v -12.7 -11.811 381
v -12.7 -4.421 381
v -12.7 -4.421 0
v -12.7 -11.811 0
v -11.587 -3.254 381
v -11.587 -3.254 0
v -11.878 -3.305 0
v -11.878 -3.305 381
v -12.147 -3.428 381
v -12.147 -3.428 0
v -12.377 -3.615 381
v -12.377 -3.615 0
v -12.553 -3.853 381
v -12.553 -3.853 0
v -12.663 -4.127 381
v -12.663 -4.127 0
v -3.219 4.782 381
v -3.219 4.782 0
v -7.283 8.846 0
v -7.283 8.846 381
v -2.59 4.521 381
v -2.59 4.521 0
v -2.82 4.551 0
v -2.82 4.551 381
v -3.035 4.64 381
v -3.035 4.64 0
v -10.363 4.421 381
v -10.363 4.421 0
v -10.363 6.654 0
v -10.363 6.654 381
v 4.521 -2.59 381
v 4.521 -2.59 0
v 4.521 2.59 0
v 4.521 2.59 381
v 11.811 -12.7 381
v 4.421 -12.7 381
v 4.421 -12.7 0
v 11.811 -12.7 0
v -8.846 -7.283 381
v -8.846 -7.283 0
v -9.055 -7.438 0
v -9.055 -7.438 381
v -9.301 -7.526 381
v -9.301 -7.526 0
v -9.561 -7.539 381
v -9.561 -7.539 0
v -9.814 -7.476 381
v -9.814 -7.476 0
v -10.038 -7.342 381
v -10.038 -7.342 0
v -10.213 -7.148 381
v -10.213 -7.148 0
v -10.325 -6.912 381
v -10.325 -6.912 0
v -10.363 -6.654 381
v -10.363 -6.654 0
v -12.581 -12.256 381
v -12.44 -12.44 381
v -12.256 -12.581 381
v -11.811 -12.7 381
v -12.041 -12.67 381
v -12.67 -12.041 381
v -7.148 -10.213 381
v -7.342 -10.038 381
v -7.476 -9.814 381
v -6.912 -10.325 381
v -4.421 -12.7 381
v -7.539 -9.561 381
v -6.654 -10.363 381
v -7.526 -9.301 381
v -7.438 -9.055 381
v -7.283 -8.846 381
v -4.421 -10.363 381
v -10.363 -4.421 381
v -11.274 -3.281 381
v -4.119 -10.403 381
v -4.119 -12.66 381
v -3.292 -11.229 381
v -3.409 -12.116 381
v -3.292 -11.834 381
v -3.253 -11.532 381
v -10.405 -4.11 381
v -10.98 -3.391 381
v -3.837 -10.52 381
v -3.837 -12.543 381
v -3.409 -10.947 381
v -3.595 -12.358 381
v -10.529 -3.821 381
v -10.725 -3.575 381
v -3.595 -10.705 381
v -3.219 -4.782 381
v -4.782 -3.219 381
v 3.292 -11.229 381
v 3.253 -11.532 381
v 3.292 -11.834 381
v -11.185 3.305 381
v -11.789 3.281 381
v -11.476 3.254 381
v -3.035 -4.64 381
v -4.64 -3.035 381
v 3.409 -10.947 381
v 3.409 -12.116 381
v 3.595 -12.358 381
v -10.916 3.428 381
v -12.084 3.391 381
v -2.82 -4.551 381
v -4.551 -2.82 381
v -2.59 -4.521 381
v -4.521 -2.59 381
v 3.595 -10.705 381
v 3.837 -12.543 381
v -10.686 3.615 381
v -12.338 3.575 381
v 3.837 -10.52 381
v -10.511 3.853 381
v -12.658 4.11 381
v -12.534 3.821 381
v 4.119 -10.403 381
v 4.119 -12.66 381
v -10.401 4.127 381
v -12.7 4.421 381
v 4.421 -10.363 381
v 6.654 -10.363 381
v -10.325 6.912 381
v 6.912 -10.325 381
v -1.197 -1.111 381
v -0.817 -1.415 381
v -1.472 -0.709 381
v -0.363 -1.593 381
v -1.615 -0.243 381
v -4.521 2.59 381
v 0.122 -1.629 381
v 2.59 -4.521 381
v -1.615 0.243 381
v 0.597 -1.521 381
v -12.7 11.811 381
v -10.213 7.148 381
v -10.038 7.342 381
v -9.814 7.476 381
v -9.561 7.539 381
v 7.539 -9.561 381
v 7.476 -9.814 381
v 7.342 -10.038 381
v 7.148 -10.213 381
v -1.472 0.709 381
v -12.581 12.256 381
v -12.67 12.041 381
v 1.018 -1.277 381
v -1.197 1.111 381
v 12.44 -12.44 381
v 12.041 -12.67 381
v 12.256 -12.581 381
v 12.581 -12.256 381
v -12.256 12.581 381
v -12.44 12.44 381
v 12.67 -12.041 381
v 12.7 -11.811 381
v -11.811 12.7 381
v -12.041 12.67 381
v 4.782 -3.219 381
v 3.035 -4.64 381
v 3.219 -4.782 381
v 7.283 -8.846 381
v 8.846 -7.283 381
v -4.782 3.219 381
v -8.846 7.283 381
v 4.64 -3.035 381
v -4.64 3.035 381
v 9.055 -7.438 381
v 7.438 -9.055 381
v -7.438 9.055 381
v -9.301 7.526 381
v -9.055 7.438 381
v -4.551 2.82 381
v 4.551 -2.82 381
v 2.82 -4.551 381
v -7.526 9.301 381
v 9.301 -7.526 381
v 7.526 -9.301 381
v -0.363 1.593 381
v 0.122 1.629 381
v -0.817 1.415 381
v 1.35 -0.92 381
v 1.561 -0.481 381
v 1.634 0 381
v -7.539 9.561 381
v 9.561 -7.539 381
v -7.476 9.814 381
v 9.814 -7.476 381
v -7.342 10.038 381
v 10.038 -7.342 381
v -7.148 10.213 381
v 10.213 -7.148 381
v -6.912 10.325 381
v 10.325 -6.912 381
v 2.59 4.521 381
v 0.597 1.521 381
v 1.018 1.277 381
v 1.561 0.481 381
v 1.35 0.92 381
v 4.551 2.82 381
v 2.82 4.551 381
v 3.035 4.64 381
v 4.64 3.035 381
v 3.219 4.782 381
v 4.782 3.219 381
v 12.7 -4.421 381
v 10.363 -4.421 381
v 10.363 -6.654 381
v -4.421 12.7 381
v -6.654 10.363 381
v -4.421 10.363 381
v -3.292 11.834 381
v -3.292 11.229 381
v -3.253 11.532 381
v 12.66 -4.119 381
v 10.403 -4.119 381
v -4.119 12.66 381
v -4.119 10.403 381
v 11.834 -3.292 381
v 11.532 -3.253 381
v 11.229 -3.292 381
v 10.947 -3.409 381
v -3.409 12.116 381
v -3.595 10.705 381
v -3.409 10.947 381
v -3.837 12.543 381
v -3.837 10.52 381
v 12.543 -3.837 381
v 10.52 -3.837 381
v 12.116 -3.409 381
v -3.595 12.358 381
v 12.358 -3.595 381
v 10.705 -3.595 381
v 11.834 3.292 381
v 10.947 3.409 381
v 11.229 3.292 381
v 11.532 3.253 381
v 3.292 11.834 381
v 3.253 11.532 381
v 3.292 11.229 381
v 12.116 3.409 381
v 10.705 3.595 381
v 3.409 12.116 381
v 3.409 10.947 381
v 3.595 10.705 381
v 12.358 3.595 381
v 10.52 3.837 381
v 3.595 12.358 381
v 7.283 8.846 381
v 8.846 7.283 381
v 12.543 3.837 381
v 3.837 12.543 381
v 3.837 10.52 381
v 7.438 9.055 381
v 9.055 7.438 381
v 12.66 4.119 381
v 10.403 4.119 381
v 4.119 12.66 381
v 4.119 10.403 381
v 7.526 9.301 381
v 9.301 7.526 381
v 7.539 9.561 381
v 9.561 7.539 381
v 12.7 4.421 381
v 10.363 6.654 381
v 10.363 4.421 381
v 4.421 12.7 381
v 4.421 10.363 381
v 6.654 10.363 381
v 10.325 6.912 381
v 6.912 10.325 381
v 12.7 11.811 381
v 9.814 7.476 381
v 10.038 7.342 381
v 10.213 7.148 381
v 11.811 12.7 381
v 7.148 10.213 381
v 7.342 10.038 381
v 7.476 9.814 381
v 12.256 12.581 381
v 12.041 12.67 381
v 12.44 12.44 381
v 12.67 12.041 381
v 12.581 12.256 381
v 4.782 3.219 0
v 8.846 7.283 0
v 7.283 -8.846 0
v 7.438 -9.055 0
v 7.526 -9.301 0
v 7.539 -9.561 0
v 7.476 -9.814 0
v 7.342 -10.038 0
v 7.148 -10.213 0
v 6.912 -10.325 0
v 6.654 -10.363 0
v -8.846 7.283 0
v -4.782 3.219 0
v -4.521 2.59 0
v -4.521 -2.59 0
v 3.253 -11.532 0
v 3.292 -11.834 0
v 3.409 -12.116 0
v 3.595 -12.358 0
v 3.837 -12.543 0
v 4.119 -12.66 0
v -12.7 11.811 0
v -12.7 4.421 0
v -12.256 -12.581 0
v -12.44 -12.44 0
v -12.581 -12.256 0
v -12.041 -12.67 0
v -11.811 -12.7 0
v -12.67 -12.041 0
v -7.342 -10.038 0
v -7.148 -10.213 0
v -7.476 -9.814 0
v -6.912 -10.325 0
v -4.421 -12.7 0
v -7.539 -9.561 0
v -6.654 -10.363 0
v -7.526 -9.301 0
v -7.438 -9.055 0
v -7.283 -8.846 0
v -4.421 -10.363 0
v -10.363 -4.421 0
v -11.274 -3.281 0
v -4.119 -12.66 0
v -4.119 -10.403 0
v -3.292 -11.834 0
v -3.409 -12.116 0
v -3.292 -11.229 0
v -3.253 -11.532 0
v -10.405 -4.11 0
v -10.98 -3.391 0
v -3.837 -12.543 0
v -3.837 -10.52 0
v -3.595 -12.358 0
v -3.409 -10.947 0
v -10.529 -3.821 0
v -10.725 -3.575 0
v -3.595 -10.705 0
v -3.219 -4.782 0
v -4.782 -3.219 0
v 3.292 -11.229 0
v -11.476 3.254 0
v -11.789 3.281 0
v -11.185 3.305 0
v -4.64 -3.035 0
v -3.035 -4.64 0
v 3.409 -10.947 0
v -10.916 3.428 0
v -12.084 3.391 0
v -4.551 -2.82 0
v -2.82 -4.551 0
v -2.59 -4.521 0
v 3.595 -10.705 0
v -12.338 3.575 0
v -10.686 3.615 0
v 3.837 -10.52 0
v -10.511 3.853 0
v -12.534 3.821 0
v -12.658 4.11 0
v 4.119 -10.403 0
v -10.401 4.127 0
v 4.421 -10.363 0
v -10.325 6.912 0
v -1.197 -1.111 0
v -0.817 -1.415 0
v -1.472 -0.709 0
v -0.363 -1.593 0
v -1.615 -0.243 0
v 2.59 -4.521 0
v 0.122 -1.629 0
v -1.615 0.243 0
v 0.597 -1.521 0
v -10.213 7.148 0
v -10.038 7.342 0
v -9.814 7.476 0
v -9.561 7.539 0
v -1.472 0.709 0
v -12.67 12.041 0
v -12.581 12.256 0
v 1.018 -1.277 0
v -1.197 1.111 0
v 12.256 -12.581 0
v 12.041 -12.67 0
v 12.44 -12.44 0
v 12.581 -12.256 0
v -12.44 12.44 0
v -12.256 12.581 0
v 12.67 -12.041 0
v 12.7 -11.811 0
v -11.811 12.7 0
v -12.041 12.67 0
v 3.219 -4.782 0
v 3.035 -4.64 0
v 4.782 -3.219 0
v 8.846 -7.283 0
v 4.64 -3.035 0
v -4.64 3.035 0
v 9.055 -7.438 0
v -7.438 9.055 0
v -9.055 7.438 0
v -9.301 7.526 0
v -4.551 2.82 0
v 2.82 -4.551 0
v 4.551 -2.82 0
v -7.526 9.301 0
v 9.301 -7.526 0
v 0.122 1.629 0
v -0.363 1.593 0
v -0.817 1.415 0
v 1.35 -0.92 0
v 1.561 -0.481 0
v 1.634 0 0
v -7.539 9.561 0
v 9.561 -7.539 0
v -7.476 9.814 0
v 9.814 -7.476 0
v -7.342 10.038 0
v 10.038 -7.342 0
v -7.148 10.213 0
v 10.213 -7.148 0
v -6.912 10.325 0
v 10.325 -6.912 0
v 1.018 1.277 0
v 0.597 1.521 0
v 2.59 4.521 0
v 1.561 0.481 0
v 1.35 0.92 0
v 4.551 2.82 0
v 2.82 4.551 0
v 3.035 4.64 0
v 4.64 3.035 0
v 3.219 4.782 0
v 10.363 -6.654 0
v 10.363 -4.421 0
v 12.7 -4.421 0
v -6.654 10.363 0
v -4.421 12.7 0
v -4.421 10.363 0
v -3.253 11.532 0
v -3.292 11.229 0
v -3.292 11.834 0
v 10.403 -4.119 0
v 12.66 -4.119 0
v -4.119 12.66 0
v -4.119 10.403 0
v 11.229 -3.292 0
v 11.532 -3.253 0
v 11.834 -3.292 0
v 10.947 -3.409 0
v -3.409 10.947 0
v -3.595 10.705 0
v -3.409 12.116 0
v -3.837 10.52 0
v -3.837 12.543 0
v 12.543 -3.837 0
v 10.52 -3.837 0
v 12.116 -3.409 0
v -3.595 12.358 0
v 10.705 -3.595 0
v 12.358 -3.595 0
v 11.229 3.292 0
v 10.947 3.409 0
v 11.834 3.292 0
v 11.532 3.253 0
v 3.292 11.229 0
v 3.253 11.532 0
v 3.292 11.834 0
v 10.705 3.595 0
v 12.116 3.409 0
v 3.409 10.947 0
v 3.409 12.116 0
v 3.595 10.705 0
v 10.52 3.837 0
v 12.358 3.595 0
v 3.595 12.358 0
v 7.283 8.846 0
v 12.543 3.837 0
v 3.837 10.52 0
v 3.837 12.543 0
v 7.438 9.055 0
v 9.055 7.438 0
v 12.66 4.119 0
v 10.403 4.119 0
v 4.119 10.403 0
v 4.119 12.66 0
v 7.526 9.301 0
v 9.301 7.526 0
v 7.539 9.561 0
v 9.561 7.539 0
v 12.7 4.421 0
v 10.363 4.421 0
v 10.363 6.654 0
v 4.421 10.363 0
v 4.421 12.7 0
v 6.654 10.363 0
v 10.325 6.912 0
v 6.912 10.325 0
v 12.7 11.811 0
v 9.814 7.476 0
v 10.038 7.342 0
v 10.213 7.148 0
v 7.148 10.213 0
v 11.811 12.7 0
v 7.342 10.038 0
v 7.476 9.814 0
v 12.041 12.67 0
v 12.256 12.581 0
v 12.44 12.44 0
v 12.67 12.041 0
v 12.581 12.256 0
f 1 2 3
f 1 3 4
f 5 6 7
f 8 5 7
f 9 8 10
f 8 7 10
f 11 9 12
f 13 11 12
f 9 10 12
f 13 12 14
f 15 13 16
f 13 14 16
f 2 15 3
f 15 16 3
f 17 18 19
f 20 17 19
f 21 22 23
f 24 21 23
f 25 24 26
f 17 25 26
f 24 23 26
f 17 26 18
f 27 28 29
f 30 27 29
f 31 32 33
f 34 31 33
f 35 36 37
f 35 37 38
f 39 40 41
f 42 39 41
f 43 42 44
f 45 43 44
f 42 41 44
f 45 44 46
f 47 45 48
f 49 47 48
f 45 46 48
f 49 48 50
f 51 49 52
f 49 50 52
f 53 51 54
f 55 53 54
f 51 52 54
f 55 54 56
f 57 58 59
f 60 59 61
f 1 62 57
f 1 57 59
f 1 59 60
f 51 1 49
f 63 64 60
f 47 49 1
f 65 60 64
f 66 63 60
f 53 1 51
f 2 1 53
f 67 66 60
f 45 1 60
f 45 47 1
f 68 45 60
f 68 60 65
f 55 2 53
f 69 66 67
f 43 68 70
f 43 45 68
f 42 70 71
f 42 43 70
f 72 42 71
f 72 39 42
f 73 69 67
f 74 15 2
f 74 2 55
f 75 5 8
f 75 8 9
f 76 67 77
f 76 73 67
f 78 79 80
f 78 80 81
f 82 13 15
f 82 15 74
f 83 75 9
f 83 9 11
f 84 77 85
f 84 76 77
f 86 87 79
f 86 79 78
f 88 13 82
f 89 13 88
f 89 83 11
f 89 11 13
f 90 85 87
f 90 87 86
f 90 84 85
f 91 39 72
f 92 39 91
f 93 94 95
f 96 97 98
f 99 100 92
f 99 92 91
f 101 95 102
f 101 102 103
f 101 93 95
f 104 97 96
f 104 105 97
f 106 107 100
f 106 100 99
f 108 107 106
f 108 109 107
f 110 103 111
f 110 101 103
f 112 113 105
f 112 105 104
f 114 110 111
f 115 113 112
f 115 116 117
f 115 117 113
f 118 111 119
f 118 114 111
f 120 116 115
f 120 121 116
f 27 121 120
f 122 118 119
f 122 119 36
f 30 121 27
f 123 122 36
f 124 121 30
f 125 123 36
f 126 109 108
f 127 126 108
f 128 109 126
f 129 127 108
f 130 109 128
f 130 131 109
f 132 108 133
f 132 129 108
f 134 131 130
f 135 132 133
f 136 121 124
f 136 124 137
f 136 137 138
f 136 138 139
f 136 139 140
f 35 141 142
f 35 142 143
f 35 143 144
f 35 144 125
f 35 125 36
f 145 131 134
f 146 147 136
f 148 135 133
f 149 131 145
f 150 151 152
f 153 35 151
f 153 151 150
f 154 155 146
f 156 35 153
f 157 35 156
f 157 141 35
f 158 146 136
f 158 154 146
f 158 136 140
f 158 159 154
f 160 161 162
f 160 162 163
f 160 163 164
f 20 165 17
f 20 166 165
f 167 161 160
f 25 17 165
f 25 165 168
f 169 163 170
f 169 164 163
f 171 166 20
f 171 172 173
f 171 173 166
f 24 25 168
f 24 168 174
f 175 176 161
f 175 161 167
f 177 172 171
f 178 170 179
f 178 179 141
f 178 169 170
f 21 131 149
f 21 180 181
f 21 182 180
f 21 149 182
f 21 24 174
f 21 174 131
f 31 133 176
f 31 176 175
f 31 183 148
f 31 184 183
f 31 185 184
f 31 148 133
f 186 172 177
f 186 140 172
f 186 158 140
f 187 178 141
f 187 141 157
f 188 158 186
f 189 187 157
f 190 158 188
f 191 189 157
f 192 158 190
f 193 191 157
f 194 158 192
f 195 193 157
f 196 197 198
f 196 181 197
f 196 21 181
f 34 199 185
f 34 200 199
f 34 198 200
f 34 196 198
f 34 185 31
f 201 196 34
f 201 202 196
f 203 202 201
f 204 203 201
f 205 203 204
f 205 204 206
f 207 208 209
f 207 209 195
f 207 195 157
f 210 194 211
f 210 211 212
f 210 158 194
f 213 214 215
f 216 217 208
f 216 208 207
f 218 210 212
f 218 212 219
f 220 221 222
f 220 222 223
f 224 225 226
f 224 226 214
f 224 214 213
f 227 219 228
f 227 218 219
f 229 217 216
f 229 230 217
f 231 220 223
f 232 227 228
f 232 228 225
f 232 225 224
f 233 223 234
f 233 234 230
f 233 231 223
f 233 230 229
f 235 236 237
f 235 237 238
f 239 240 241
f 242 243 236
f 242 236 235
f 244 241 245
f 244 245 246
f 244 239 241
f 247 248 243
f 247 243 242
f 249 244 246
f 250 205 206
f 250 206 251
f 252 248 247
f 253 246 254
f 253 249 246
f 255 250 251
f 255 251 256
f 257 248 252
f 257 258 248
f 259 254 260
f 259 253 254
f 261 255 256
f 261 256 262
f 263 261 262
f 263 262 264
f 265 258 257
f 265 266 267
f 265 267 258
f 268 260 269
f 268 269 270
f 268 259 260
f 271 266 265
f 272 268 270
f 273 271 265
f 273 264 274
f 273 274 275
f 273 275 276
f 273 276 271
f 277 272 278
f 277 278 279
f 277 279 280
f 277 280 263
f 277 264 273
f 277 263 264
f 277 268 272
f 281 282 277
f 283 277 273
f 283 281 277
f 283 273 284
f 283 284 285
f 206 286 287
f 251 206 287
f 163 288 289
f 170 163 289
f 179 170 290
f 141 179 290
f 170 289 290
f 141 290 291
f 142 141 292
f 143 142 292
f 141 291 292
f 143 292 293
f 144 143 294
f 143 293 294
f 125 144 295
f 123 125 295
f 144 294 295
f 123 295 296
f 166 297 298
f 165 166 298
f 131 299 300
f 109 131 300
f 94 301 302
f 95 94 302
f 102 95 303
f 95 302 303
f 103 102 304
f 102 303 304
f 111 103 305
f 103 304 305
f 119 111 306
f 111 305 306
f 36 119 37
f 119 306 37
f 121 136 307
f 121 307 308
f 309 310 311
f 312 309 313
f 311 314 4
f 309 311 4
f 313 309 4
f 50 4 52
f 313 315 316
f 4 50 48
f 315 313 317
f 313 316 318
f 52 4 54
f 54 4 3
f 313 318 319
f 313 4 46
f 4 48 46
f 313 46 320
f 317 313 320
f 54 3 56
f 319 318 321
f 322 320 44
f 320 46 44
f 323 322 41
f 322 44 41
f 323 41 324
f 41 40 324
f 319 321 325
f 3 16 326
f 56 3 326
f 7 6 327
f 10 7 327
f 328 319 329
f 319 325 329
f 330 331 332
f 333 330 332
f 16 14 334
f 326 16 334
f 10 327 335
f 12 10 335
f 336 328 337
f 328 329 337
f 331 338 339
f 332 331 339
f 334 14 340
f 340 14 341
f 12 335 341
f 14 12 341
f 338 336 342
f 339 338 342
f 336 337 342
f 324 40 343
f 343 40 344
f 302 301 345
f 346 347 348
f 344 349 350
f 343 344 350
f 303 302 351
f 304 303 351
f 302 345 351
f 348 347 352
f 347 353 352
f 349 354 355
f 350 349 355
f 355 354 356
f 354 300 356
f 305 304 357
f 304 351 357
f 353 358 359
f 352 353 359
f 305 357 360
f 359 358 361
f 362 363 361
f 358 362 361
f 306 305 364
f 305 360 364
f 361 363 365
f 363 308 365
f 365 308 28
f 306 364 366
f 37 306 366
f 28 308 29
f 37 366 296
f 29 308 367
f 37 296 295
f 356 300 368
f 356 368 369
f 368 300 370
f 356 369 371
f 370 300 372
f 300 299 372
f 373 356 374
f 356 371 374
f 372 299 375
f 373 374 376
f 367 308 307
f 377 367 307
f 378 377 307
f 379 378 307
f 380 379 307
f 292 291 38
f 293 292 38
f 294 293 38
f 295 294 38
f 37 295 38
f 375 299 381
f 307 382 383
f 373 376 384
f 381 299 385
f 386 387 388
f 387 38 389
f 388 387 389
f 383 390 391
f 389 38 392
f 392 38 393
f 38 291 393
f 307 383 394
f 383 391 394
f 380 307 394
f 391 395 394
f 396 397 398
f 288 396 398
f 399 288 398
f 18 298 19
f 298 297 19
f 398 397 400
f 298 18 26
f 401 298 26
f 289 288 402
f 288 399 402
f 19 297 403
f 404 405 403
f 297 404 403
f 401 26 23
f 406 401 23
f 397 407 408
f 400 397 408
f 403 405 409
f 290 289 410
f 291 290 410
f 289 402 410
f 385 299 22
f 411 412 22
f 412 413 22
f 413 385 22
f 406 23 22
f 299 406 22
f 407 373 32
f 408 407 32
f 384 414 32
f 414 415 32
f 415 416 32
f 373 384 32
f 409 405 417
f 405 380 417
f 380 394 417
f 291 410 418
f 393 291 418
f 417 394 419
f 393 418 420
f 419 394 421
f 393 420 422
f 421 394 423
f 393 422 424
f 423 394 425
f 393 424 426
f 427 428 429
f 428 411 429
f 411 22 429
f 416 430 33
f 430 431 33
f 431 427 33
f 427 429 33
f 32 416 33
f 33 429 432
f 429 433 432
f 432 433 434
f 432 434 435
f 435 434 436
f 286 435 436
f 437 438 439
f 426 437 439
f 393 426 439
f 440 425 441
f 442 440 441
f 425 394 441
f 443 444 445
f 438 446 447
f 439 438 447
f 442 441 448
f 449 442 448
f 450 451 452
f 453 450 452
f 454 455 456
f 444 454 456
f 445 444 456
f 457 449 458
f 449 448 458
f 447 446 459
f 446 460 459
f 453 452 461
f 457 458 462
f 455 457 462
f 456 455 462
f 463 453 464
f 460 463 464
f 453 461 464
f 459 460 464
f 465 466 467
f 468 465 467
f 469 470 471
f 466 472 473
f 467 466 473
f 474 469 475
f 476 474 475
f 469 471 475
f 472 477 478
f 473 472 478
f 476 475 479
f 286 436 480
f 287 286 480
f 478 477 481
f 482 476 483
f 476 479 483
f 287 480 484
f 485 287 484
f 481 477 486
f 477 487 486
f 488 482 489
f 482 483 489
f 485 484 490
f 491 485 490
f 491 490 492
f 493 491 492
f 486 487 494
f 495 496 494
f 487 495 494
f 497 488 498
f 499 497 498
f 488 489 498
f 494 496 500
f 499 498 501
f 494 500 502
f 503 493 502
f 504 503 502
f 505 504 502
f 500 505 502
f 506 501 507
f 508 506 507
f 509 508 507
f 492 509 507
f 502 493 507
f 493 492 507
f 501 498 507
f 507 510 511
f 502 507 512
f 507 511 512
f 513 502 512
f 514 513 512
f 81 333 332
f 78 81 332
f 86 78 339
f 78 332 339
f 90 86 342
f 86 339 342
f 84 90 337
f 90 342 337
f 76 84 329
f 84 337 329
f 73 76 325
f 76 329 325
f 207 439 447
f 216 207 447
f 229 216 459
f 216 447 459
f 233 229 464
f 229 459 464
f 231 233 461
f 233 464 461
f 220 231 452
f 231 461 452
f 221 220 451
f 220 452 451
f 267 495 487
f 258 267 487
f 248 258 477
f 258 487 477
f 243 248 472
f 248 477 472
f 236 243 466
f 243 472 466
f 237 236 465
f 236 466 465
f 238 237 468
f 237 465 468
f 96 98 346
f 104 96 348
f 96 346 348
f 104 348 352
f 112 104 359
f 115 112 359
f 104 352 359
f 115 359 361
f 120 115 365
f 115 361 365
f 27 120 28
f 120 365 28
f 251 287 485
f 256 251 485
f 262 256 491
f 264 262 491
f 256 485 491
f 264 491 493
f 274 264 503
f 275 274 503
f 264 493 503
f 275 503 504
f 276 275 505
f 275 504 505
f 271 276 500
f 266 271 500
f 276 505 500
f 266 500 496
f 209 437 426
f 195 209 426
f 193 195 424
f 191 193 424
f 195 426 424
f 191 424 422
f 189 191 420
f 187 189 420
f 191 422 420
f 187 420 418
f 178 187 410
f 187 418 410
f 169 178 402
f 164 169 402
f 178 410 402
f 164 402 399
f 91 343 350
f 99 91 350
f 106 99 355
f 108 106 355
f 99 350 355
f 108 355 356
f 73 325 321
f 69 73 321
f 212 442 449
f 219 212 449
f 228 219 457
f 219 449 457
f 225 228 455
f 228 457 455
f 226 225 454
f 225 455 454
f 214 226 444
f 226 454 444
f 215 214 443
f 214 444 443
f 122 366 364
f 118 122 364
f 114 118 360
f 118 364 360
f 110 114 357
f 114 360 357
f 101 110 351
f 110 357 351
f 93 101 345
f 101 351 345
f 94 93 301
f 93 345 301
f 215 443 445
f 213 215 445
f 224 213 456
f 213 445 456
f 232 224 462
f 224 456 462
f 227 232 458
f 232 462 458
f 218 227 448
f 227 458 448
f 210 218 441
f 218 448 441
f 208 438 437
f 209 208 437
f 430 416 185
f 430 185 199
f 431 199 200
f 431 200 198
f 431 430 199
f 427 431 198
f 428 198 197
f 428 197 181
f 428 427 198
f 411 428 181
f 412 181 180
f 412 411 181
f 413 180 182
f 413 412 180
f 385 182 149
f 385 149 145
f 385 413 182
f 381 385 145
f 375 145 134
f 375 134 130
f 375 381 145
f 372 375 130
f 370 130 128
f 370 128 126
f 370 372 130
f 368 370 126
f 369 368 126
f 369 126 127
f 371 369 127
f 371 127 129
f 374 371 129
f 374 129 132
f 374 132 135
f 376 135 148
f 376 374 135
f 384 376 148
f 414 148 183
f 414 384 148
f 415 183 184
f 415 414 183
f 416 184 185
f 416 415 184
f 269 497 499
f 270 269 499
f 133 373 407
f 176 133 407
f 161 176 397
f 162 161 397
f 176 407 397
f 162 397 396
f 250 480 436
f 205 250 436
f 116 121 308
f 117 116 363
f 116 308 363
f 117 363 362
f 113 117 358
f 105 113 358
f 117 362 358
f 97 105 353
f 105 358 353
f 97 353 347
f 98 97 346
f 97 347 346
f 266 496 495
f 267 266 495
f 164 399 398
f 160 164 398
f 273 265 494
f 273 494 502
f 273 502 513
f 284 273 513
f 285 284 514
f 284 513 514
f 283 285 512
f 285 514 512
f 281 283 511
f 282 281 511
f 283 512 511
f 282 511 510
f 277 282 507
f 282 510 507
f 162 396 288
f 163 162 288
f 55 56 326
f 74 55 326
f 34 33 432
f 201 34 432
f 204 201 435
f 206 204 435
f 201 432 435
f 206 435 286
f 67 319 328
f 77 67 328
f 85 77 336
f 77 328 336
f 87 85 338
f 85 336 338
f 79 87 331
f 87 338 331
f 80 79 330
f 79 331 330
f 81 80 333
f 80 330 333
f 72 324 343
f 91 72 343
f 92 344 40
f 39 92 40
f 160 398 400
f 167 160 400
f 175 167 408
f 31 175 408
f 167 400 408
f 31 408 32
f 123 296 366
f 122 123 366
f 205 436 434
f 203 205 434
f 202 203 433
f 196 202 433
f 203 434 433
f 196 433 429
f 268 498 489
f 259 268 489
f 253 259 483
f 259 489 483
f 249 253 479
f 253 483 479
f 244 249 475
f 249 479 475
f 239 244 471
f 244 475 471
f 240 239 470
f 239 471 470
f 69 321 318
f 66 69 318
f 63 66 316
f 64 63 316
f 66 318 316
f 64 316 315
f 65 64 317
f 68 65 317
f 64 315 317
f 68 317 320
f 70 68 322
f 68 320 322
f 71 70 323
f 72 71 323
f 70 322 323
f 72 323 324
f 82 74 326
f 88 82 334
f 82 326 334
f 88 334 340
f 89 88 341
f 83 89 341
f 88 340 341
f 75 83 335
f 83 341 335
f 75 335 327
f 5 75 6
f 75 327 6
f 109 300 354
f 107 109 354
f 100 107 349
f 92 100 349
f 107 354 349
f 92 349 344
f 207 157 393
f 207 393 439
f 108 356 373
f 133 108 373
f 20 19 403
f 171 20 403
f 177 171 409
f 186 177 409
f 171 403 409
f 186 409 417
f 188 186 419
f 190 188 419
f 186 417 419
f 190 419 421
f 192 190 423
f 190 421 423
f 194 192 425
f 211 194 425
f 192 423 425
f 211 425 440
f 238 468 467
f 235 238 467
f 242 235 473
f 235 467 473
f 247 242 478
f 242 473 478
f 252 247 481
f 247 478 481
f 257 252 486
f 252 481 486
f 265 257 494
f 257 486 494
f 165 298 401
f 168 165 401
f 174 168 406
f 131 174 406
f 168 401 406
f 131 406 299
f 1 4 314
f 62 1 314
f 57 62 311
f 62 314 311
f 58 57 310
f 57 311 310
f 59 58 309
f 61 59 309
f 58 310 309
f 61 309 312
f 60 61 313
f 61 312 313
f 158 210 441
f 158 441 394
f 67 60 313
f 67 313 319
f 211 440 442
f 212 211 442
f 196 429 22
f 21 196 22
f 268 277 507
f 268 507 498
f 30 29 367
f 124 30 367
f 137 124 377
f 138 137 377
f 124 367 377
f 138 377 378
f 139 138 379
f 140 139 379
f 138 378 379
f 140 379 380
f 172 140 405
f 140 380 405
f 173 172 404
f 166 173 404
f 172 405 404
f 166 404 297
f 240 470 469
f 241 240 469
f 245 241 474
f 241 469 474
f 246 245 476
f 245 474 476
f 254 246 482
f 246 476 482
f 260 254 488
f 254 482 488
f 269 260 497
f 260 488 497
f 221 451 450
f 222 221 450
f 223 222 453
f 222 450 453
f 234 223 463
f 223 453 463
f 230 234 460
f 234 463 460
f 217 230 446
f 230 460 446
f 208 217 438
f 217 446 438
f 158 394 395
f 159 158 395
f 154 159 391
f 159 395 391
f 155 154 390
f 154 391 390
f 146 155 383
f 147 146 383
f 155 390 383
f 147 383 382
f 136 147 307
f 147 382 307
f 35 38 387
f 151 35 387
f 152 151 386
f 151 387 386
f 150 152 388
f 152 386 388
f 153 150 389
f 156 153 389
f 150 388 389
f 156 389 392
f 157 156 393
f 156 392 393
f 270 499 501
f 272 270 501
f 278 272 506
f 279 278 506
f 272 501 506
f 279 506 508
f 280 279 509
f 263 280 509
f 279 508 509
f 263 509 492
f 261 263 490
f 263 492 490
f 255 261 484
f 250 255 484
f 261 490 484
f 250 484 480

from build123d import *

# Parameters (mm, degrees)
F1_R     = 1.6335205603
F2_DEPTH = 381


# Not quite as in the source:
# - a variable given as a bare number and used for a length is read in inches; the dataset says mm whatever the document's units were


with BuildPart() as f2:
    # F1 (on Top) → F2 (new body)
    with BuildSketch(Plane.XY):
        with BuildLine():
            Line((-2.590399578, -4.5212), (2.590399578, -4.5212))
            ThreePointArc((2.590399578, -4.5212), (2.9306051494, -4.5888710956), (3.2190175065, -4.7815820715))
            Line((3.2190175065, -4.7815820715), (7.2830175065, -8.8455820715))
            ThreePointArc((7.2830175065, -8.8455820715), (7.4757284824, -9.8144055714), (6.654399578, -10.3632))
            Line((6.654399578, -10.3632), (4.4209109178, -10.3632))
            ThreePointArc((4.4209109178, -10.3632), (3.5947273547, -10.7054164369), (3.2525109178, -11.5316))
            ThreePointArc((3.2525109178, -11.5316), (3.5947273547, -12.3577835631), (4.4209109178, -12.7))
            Line((4.4209109178, -12.7), (11.811, -12.7))
            ThreePointArc((11.811, -12.7), (12.4396179285, -12.4396179285), (12.7, -11.811))
            Line((12.7, -11.811), (12.7, -4.4209109178))
            ThreePointArc((12.7, -4.4209109178), (12.3577835631, -3.5947273547), (11.5316, -3.2525109178))
            ThreePointArc((11.5316, -3.2525109178), (10.7054164369, -3.5947273547), (10.3632, -4.4209109178))
            Line((10.3632, -4.4209109178), (10.3632, -6.654399578))
            ThreePointArc((10.3632, -6.654399578), (9.8144055714, -7.4757284824), (8.8455820715, -7.2830175065))
            Line((8.8455820715, -7.2830175065), (4.7815820715, -3.2190175065))
            ThreePointArc((4.7815820715, -3.2190175065), (4.5888710956, -2.9306051494), (4.5212, -2.590399578))
            Line((4.5212, -2.590399578), (4.5212, 2.590399578))
            ThreePointArc((4.5212, 2.590399578), (4.5888710956, 2.9306051494), (4.7815820715, 3.2190175065))
            Line((4.7815820715, 3.2190175065), (8.8455820715, 7.2830175065))
            ThreePointArc((8.8455820715, 7.2830175065), (9.8144055714, 7.4757284824), (10.3632, 6.654399578))
            Line((10.3632, 6.654399578), (10.3632, 4.4209109178))
            ThreePointArc((10.3632, 4.4209109178), (10.7054164369, 3.5947273547), (11.5316, 3.2525109178))
            ThreePointArc((11.5316, 3.2525109178), (12.3577835631, 3.5947273547), (12.7, 4.4209109178))
            Line((12.7, 4.4209109178), (12.7, 11.811))
            ThreePointArc((12.7, 11.811), (12.4396179285, 12.4396179285), (11.811, 12.7))
            Line((11.811, 12.7), (4.4209109178, 12.7))
            ThreePointArc((4.4209109178, 12.7), (3.5947273547, 12.3577835631), (3.2525109178, 11.5316))
            ThreePointArc((3.2525109178, 11.5316), (3.5947273547, 10.7054164369), (4.4209109178, 10.3632))
            Line((4.4209109178, 10.3632), (6.654399578, 10.3632))
            ThreePointArc((6.654399578, 10.3632), (7.4757284824, 9.8144055714), (7.2830175065, 8.8455820715))
            Line((7.2830175065, 8.8455820715), (3.2190175065, 4.7815820715))
            ThreePointArc((3.2190175065, 4.7815820715), (2.9306051494, 4.5888710956), (2.590399578, 4.5212))
            Line((2.590399578, 4.5212), (-2.590399578, 4.5212))
            ThreePointArc((-2.590399578, 4.5212), (-2.9306051494, 4.5888710956), (-3.2190175065, 4.7815820715))
            Line((-3.2190175065, 4.7815820715), (-7.2830175065, 8.8455820715))
            ThreePointArc((-7.2830175065, 8.8455820715), (-7.4757284824, 9.8144055714), (-6.654399578, 10.3632))
            Line((-6.654399578, 10.3632), (-4.4209109178, 10.3632))
            ThreePointArc((-4.4209109178, 10.3632), (-3.5947273547, 10.7054164369), (-3.2525109178, 11.5316))
            ThreePointArc((-3.2525109178, 11.5316), (-3.5947273547, 12.3577835631), (-4.4209109178, 12.7))
            Line((-4.4209109178, 12.7), (-11.811, 12.7))
            ThreePointArc((-11.811, 12.7), (-12.4396179285, 12.4396179285), (-12.7, 11.811))
            Line((-12.7, 11.811), (-12.7, 4.4209109178))
            ThreePointArc((-12.7, 4.4209109178), (-12.3379947006, 3.575401517), (-11.4762989613, 3.2538203664))
            ThreePointArc((-11.4762989613, 3.2538203664), (-10.6860905992, 3.6145162172), (-10.3632, 4.4209109178))
            Line((-10.3632, 4.4209109178), (-10.3632, 6.654399578))
            ThreePointArc((-10.3632, 6.654399578), (-9.8144055714, 7.4757284824), (-8.8455820715, 7.2830175065))
            Line((-8.8455820715, 7.2830175065), (-4.7815820715, 3.2190175065))
            ThreePointArc((-4.7815820715, 3.2190175065), (-4.5888710956, 2.9306051494), (-4.5212, 2.590399578))
            Line((-4.5212, 2.590399578), (-4.5212, -2.590399578))
            ThreePointArc((-4.5212, -2.590399578), (-4.5888710956, -2.9306051494), (-4.7815820715, -3.2190175065))
            Line((-4.7815820715, -3.2190175065), (-8.8455820715, -7.2830175065))
            ThreePointArc((-8.8455820715, -7.2830175065), (-9.8144055714, -7.4757284824), (-10.3632, -6.654399578))
            Line((-10.3632, -6.654399578), (-10.3632, -4.4209109178))
            ThreePointArc((-10.3632, -4.4209109178), (-10.7252052994, -3.575401517), (-11.5869010387, -3.2538203664))
            ThreePointArc((-11.5869010387, -3.2538203664), (-12.3771094008, -3.6145162172), (-12.7, -4.4209109178))
            Line((-12.7, -4.4209109178), (-12.7, -11.811))
            ThreePointArc((-12.7, -11.811), (-12.4396179285, -12.4396179285), (-11.811, -12.7))
            Line((-11.811, -12.7), (-4.4209109178, -12.7))
            ThreePointArc((-4.4209109178, -12.7), (-3.5947273547, -12.3577835631), (-3.2525109178, -11.5316))
            ThreePointArc((-3.2525109178, -11.5316), (-3.5947273547, -10.7054164369), (-4.4209109178, -10.3632))
            Line((-4.4209109178, -10.3632), (-6.654399578, -10.3632))
            ThreePointArc((-6.654399578, -10.3632), (-7.4757284824, -9.8144055714), (-7.2830175065, -8.8455820715))
            Line((-7.2830175065, -8.8455820715), (-3.2190175065, -4.7815820715))
            ThreePointArc((-3.2190175065, -4.7815820715), (-2.9306051494, -4.5888710956), (-2.590399578, -4.5212))
        make_face()
        Circle(F1_R, mode=Mode.SUBTRACT)
    extrude(amount=F2_DEPTH)


solid = f2.part
